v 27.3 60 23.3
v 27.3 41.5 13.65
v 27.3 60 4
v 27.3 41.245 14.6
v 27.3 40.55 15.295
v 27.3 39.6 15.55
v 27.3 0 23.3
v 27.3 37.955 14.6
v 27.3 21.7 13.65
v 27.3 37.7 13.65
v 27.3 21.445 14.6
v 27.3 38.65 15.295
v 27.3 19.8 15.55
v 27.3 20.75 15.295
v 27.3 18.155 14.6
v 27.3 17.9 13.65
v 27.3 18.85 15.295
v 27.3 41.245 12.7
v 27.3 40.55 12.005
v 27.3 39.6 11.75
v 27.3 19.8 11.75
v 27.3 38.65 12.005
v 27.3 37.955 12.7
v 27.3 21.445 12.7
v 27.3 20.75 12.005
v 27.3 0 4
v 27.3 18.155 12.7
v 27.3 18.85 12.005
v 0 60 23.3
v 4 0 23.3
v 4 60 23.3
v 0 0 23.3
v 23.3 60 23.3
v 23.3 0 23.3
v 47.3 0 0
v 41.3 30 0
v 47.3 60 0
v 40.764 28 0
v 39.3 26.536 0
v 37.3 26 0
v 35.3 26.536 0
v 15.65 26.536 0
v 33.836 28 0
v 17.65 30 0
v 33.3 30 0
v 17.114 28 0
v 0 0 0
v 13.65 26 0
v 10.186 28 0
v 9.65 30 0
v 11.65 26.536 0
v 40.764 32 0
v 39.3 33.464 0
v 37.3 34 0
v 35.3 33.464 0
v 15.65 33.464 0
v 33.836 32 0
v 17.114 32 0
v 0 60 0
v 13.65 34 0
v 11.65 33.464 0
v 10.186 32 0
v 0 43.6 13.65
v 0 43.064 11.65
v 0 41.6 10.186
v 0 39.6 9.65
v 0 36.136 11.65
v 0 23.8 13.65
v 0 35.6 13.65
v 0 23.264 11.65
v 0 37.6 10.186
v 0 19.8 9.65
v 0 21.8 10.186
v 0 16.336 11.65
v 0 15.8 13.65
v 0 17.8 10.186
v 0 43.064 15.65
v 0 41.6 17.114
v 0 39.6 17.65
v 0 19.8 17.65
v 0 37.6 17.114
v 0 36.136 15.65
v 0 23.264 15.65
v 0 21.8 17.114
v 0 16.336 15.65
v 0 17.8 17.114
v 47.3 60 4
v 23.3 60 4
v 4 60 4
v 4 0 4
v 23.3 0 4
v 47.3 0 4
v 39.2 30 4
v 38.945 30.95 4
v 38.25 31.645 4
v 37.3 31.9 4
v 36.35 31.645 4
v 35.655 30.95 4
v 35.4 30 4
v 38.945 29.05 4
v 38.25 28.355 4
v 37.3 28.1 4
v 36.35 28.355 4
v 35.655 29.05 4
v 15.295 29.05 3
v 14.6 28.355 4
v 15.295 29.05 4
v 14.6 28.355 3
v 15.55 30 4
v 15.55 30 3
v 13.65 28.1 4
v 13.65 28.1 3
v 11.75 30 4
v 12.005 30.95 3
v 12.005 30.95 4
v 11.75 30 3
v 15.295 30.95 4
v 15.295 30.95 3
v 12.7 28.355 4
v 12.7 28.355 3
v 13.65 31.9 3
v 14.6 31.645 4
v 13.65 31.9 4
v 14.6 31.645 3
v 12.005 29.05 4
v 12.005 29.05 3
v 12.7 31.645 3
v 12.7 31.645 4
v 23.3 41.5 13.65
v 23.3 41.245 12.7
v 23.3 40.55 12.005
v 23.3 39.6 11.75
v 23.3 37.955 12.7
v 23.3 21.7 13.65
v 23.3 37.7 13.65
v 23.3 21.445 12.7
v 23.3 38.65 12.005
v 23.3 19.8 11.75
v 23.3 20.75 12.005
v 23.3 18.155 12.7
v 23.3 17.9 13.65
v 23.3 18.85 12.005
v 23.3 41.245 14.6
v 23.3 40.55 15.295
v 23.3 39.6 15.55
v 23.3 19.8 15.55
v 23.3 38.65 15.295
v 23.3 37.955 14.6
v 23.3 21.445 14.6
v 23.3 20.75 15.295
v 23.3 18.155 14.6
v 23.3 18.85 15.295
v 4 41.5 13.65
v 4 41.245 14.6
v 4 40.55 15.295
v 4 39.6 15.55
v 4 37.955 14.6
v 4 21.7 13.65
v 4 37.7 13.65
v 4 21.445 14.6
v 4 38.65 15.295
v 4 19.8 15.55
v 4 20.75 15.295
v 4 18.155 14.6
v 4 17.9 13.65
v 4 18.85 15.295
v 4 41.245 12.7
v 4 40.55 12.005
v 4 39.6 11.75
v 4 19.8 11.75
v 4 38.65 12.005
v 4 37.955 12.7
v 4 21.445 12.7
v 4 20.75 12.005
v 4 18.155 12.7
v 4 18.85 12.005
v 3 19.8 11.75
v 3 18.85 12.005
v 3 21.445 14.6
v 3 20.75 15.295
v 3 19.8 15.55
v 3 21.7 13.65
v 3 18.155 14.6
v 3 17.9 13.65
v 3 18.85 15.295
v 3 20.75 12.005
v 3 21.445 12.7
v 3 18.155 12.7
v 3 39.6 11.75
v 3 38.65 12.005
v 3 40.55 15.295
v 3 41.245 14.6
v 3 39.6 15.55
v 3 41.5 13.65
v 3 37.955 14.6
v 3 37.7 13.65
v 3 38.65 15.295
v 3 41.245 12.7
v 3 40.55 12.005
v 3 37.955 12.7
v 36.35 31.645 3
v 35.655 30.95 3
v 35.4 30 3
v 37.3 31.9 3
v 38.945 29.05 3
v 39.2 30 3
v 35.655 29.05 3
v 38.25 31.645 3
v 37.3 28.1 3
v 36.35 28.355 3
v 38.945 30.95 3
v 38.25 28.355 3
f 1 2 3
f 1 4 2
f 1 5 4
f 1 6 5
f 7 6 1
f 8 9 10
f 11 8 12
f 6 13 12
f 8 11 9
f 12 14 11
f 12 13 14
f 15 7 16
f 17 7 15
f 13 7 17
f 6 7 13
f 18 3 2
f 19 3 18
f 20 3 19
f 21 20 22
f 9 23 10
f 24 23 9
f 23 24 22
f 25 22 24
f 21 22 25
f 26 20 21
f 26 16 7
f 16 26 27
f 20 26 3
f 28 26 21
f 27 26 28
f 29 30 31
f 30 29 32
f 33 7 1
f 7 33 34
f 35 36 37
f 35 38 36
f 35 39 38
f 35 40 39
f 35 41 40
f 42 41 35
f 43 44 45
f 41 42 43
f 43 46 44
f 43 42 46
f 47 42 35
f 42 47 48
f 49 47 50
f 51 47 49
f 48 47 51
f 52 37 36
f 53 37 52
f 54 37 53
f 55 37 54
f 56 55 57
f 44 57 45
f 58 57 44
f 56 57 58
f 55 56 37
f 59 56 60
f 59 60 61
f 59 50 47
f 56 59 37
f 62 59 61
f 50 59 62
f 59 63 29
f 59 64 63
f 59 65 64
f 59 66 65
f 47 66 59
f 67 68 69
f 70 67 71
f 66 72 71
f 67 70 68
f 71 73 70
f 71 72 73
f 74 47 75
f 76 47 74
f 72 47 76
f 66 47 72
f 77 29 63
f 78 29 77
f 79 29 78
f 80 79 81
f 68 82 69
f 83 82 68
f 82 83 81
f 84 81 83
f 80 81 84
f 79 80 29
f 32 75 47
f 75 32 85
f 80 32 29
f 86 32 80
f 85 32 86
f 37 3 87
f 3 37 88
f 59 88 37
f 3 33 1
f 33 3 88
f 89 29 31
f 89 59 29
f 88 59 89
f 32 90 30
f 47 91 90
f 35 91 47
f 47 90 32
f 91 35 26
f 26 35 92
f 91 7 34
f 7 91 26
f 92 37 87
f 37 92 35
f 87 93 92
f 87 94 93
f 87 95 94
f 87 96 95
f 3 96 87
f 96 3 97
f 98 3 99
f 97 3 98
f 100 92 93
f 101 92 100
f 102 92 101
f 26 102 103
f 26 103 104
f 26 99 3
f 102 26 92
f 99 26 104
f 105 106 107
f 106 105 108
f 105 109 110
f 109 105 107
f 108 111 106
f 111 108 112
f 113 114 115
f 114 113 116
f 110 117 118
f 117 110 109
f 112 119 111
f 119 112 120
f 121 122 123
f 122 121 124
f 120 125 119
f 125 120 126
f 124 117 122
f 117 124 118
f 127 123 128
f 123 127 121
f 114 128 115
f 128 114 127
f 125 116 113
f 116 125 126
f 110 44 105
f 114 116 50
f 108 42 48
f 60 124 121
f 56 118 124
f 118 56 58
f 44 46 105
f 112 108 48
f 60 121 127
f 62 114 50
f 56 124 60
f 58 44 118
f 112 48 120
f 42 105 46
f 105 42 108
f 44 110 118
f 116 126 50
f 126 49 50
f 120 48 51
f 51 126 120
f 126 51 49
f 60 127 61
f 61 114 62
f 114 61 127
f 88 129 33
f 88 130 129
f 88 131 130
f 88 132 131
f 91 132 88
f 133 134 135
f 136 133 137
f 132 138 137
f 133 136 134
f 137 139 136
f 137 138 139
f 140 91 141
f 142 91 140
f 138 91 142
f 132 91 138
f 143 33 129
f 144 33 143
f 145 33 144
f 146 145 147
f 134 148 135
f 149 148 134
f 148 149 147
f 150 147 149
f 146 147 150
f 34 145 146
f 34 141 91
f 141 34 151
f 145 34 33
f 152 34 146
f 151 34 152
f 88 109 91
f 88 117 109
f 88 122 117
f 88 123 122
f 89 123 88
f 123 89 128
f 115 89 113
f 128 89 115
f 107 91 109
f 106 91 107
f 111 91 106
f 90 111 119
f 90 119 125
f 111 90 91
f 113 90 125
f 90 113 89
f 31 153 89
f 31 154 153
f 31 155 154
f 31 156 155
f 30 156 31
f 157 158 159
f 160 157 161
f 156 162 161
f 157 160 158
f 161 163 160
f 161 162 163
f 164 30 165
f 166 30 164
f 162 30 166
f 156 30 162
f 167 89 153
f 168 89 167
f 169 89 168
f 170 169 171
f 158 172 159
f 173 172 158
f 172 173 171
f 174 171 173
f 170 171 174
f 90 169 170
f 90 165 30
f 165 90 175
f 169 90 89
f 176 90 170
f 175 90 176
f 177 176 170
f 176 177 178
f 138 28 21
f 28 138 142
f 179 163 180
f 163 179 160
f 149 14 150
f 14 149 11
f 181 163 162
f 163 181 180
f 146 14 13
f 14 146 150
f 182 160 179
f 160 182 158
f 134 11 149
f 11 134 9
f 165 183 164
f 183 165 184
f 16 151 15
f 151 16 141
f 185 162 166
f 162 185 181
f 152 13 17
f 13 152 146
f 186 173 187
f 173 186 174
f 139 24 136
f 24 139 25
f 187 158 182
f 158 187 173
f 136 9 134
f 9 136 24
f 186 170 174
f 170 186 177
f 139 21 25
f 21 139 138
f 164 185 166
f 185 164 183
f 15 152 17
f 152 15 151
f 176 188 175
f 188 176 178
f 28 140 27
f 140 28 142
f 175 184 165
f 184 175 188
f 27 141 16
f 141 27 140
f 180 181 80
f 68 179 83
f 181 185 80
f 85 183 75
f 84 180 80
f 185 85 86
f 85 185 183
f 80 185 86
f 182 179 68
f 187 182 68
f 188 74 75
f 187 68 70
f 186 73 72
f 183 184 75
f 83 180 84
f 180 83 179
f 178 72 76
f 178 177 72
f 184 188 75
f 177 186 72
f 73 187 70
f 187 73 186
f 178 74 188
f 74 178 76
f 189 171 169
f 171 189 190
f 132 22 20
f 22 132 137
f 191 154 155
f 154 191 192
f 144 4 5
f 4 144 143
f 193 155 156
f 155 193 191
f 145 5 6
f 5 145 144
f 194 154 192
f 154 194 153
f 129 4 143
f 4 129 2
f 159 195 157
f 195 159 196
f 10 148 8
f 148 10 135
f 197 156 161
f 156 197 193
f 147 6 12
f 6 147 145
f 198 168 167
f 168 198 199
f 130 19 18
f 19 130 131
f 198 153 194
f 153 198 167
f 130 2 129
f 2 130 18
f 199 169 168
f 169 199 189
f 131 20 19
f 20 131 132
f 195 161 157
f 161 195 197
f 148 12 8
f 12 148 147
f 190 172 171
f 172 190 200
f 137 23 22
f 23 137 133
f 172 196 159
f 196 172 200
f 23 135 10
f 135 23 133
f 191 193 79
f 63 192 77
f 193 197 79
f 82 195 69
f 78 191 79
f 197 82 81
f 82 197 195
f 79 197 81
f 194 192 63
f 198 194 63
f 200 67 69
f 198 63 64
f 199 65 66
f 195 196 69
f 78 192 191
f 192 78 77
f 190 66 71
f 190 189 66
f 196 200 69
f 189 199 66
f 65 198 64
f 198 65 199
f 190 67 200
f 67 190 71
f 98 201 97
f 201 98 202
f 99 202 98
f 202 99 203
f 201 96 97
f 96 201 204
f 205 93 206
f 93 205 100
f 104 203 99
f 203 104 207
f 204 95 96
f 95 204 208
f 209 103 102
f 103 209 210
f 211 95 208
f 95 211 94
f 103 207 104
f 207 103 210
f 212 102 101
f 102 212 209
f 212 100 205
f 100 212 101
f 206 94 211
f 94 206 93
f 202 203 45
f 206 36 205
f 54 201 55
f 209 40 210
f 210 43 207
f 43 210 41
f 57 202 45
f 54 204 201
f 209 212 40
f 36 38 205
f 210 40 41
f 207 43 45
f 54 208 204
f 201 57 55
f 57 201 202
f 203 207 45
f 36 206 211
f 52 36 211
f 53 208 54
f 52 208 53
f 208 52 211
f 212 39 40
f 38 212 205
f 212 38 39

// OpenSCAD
difference(){
	union() {
		translate(v = [0, 0, 0]) {
			cube(size = [27.3000000000, 60, 23.3000000000]);
		}
		translate(v = [27.3000000000, 0, 0]) {
			cube(size = [20, 60, 4]);
		}
	}
	/* Holes Below*/
	union(){
		translate(v = [0, 0, 0]){
			translate(v = [4, -1, 4]) {
				cube(size = [19.3000000000, 62, 28.3000000000]);
			}
			translate(v = [13.6500000000, 30.0000000000, 0]) {
				rotate(a = -180, v = [1, 0, 0]) {
					union() {
						union() {
							translate(v = [0, 0, -5]) {
								cylinder($fn = 12, h = 5, r = 1.9000000000);
							}
							translate(v = [0, 0, -3]) {
								cylinder($fn = 12, h = 3, r1 = 1.9000000000, r2 = 4);
							}
						}
						cylinder($fn = 12, h = 1, r = 4);
					}
				}
			}
		}
		translate(v = [0, 19.8000000000, 13.6500000000]) {
			rotate(a = -90, v = [0, 1, 0]) {
				union() {
					union() {
						translate(v = [0, 0, -28.3000000000]) {
							cylinder($fn = 12, h = 28.3000000000, r = 1.9000000000);
						}
						translate(v = [0, 0, -3]) {
							cylinder($fn = 12, h = 3, r1 = 1.9000000000, r2 = 4);
						}
					}
					cylinder($fn = 12, h = 1, r = 4);
				}
			}
		}
		translate(v = [0, 39.6000000000, 13.6500000000]) {
			rotate(a = -90, v = [0, 1, 0]) {
				union() {
					union() {
						translate(v = [0, 0, -28.3000000000]) {
							cylinder($fn = 12, h = 28.3000000000, r = 1.9000000000);
						}
						translate(v = [0, 0, -3]) {
							cylinder($fn = 12, h = 3, r1 = 1.9000000000, r2 = 4);
						}
					}
					cylinder($fn = 12, h = 1, r = 4);
				}
			}
		}
		translate(v = [37.3000000000, 30.0000000000, 0]) {
			rotate(a = 180, v = [0, 1, 0]) {
				union() {
					union() {
						translate(v = [0, 0, -5]) {
							cylinder($fn = 12, h = 5, r = 1.9000000000);
						}
						translate(v = [0, 0, -3]) {
							cylinder($fn = 12, h = 3, r1 = 1.9000000000, r2 = 4);
						}
					}
					cylinder($fn = 12, h = 1, r = 4);
				}
			}
		}
	} /* End Holes */ 
}
